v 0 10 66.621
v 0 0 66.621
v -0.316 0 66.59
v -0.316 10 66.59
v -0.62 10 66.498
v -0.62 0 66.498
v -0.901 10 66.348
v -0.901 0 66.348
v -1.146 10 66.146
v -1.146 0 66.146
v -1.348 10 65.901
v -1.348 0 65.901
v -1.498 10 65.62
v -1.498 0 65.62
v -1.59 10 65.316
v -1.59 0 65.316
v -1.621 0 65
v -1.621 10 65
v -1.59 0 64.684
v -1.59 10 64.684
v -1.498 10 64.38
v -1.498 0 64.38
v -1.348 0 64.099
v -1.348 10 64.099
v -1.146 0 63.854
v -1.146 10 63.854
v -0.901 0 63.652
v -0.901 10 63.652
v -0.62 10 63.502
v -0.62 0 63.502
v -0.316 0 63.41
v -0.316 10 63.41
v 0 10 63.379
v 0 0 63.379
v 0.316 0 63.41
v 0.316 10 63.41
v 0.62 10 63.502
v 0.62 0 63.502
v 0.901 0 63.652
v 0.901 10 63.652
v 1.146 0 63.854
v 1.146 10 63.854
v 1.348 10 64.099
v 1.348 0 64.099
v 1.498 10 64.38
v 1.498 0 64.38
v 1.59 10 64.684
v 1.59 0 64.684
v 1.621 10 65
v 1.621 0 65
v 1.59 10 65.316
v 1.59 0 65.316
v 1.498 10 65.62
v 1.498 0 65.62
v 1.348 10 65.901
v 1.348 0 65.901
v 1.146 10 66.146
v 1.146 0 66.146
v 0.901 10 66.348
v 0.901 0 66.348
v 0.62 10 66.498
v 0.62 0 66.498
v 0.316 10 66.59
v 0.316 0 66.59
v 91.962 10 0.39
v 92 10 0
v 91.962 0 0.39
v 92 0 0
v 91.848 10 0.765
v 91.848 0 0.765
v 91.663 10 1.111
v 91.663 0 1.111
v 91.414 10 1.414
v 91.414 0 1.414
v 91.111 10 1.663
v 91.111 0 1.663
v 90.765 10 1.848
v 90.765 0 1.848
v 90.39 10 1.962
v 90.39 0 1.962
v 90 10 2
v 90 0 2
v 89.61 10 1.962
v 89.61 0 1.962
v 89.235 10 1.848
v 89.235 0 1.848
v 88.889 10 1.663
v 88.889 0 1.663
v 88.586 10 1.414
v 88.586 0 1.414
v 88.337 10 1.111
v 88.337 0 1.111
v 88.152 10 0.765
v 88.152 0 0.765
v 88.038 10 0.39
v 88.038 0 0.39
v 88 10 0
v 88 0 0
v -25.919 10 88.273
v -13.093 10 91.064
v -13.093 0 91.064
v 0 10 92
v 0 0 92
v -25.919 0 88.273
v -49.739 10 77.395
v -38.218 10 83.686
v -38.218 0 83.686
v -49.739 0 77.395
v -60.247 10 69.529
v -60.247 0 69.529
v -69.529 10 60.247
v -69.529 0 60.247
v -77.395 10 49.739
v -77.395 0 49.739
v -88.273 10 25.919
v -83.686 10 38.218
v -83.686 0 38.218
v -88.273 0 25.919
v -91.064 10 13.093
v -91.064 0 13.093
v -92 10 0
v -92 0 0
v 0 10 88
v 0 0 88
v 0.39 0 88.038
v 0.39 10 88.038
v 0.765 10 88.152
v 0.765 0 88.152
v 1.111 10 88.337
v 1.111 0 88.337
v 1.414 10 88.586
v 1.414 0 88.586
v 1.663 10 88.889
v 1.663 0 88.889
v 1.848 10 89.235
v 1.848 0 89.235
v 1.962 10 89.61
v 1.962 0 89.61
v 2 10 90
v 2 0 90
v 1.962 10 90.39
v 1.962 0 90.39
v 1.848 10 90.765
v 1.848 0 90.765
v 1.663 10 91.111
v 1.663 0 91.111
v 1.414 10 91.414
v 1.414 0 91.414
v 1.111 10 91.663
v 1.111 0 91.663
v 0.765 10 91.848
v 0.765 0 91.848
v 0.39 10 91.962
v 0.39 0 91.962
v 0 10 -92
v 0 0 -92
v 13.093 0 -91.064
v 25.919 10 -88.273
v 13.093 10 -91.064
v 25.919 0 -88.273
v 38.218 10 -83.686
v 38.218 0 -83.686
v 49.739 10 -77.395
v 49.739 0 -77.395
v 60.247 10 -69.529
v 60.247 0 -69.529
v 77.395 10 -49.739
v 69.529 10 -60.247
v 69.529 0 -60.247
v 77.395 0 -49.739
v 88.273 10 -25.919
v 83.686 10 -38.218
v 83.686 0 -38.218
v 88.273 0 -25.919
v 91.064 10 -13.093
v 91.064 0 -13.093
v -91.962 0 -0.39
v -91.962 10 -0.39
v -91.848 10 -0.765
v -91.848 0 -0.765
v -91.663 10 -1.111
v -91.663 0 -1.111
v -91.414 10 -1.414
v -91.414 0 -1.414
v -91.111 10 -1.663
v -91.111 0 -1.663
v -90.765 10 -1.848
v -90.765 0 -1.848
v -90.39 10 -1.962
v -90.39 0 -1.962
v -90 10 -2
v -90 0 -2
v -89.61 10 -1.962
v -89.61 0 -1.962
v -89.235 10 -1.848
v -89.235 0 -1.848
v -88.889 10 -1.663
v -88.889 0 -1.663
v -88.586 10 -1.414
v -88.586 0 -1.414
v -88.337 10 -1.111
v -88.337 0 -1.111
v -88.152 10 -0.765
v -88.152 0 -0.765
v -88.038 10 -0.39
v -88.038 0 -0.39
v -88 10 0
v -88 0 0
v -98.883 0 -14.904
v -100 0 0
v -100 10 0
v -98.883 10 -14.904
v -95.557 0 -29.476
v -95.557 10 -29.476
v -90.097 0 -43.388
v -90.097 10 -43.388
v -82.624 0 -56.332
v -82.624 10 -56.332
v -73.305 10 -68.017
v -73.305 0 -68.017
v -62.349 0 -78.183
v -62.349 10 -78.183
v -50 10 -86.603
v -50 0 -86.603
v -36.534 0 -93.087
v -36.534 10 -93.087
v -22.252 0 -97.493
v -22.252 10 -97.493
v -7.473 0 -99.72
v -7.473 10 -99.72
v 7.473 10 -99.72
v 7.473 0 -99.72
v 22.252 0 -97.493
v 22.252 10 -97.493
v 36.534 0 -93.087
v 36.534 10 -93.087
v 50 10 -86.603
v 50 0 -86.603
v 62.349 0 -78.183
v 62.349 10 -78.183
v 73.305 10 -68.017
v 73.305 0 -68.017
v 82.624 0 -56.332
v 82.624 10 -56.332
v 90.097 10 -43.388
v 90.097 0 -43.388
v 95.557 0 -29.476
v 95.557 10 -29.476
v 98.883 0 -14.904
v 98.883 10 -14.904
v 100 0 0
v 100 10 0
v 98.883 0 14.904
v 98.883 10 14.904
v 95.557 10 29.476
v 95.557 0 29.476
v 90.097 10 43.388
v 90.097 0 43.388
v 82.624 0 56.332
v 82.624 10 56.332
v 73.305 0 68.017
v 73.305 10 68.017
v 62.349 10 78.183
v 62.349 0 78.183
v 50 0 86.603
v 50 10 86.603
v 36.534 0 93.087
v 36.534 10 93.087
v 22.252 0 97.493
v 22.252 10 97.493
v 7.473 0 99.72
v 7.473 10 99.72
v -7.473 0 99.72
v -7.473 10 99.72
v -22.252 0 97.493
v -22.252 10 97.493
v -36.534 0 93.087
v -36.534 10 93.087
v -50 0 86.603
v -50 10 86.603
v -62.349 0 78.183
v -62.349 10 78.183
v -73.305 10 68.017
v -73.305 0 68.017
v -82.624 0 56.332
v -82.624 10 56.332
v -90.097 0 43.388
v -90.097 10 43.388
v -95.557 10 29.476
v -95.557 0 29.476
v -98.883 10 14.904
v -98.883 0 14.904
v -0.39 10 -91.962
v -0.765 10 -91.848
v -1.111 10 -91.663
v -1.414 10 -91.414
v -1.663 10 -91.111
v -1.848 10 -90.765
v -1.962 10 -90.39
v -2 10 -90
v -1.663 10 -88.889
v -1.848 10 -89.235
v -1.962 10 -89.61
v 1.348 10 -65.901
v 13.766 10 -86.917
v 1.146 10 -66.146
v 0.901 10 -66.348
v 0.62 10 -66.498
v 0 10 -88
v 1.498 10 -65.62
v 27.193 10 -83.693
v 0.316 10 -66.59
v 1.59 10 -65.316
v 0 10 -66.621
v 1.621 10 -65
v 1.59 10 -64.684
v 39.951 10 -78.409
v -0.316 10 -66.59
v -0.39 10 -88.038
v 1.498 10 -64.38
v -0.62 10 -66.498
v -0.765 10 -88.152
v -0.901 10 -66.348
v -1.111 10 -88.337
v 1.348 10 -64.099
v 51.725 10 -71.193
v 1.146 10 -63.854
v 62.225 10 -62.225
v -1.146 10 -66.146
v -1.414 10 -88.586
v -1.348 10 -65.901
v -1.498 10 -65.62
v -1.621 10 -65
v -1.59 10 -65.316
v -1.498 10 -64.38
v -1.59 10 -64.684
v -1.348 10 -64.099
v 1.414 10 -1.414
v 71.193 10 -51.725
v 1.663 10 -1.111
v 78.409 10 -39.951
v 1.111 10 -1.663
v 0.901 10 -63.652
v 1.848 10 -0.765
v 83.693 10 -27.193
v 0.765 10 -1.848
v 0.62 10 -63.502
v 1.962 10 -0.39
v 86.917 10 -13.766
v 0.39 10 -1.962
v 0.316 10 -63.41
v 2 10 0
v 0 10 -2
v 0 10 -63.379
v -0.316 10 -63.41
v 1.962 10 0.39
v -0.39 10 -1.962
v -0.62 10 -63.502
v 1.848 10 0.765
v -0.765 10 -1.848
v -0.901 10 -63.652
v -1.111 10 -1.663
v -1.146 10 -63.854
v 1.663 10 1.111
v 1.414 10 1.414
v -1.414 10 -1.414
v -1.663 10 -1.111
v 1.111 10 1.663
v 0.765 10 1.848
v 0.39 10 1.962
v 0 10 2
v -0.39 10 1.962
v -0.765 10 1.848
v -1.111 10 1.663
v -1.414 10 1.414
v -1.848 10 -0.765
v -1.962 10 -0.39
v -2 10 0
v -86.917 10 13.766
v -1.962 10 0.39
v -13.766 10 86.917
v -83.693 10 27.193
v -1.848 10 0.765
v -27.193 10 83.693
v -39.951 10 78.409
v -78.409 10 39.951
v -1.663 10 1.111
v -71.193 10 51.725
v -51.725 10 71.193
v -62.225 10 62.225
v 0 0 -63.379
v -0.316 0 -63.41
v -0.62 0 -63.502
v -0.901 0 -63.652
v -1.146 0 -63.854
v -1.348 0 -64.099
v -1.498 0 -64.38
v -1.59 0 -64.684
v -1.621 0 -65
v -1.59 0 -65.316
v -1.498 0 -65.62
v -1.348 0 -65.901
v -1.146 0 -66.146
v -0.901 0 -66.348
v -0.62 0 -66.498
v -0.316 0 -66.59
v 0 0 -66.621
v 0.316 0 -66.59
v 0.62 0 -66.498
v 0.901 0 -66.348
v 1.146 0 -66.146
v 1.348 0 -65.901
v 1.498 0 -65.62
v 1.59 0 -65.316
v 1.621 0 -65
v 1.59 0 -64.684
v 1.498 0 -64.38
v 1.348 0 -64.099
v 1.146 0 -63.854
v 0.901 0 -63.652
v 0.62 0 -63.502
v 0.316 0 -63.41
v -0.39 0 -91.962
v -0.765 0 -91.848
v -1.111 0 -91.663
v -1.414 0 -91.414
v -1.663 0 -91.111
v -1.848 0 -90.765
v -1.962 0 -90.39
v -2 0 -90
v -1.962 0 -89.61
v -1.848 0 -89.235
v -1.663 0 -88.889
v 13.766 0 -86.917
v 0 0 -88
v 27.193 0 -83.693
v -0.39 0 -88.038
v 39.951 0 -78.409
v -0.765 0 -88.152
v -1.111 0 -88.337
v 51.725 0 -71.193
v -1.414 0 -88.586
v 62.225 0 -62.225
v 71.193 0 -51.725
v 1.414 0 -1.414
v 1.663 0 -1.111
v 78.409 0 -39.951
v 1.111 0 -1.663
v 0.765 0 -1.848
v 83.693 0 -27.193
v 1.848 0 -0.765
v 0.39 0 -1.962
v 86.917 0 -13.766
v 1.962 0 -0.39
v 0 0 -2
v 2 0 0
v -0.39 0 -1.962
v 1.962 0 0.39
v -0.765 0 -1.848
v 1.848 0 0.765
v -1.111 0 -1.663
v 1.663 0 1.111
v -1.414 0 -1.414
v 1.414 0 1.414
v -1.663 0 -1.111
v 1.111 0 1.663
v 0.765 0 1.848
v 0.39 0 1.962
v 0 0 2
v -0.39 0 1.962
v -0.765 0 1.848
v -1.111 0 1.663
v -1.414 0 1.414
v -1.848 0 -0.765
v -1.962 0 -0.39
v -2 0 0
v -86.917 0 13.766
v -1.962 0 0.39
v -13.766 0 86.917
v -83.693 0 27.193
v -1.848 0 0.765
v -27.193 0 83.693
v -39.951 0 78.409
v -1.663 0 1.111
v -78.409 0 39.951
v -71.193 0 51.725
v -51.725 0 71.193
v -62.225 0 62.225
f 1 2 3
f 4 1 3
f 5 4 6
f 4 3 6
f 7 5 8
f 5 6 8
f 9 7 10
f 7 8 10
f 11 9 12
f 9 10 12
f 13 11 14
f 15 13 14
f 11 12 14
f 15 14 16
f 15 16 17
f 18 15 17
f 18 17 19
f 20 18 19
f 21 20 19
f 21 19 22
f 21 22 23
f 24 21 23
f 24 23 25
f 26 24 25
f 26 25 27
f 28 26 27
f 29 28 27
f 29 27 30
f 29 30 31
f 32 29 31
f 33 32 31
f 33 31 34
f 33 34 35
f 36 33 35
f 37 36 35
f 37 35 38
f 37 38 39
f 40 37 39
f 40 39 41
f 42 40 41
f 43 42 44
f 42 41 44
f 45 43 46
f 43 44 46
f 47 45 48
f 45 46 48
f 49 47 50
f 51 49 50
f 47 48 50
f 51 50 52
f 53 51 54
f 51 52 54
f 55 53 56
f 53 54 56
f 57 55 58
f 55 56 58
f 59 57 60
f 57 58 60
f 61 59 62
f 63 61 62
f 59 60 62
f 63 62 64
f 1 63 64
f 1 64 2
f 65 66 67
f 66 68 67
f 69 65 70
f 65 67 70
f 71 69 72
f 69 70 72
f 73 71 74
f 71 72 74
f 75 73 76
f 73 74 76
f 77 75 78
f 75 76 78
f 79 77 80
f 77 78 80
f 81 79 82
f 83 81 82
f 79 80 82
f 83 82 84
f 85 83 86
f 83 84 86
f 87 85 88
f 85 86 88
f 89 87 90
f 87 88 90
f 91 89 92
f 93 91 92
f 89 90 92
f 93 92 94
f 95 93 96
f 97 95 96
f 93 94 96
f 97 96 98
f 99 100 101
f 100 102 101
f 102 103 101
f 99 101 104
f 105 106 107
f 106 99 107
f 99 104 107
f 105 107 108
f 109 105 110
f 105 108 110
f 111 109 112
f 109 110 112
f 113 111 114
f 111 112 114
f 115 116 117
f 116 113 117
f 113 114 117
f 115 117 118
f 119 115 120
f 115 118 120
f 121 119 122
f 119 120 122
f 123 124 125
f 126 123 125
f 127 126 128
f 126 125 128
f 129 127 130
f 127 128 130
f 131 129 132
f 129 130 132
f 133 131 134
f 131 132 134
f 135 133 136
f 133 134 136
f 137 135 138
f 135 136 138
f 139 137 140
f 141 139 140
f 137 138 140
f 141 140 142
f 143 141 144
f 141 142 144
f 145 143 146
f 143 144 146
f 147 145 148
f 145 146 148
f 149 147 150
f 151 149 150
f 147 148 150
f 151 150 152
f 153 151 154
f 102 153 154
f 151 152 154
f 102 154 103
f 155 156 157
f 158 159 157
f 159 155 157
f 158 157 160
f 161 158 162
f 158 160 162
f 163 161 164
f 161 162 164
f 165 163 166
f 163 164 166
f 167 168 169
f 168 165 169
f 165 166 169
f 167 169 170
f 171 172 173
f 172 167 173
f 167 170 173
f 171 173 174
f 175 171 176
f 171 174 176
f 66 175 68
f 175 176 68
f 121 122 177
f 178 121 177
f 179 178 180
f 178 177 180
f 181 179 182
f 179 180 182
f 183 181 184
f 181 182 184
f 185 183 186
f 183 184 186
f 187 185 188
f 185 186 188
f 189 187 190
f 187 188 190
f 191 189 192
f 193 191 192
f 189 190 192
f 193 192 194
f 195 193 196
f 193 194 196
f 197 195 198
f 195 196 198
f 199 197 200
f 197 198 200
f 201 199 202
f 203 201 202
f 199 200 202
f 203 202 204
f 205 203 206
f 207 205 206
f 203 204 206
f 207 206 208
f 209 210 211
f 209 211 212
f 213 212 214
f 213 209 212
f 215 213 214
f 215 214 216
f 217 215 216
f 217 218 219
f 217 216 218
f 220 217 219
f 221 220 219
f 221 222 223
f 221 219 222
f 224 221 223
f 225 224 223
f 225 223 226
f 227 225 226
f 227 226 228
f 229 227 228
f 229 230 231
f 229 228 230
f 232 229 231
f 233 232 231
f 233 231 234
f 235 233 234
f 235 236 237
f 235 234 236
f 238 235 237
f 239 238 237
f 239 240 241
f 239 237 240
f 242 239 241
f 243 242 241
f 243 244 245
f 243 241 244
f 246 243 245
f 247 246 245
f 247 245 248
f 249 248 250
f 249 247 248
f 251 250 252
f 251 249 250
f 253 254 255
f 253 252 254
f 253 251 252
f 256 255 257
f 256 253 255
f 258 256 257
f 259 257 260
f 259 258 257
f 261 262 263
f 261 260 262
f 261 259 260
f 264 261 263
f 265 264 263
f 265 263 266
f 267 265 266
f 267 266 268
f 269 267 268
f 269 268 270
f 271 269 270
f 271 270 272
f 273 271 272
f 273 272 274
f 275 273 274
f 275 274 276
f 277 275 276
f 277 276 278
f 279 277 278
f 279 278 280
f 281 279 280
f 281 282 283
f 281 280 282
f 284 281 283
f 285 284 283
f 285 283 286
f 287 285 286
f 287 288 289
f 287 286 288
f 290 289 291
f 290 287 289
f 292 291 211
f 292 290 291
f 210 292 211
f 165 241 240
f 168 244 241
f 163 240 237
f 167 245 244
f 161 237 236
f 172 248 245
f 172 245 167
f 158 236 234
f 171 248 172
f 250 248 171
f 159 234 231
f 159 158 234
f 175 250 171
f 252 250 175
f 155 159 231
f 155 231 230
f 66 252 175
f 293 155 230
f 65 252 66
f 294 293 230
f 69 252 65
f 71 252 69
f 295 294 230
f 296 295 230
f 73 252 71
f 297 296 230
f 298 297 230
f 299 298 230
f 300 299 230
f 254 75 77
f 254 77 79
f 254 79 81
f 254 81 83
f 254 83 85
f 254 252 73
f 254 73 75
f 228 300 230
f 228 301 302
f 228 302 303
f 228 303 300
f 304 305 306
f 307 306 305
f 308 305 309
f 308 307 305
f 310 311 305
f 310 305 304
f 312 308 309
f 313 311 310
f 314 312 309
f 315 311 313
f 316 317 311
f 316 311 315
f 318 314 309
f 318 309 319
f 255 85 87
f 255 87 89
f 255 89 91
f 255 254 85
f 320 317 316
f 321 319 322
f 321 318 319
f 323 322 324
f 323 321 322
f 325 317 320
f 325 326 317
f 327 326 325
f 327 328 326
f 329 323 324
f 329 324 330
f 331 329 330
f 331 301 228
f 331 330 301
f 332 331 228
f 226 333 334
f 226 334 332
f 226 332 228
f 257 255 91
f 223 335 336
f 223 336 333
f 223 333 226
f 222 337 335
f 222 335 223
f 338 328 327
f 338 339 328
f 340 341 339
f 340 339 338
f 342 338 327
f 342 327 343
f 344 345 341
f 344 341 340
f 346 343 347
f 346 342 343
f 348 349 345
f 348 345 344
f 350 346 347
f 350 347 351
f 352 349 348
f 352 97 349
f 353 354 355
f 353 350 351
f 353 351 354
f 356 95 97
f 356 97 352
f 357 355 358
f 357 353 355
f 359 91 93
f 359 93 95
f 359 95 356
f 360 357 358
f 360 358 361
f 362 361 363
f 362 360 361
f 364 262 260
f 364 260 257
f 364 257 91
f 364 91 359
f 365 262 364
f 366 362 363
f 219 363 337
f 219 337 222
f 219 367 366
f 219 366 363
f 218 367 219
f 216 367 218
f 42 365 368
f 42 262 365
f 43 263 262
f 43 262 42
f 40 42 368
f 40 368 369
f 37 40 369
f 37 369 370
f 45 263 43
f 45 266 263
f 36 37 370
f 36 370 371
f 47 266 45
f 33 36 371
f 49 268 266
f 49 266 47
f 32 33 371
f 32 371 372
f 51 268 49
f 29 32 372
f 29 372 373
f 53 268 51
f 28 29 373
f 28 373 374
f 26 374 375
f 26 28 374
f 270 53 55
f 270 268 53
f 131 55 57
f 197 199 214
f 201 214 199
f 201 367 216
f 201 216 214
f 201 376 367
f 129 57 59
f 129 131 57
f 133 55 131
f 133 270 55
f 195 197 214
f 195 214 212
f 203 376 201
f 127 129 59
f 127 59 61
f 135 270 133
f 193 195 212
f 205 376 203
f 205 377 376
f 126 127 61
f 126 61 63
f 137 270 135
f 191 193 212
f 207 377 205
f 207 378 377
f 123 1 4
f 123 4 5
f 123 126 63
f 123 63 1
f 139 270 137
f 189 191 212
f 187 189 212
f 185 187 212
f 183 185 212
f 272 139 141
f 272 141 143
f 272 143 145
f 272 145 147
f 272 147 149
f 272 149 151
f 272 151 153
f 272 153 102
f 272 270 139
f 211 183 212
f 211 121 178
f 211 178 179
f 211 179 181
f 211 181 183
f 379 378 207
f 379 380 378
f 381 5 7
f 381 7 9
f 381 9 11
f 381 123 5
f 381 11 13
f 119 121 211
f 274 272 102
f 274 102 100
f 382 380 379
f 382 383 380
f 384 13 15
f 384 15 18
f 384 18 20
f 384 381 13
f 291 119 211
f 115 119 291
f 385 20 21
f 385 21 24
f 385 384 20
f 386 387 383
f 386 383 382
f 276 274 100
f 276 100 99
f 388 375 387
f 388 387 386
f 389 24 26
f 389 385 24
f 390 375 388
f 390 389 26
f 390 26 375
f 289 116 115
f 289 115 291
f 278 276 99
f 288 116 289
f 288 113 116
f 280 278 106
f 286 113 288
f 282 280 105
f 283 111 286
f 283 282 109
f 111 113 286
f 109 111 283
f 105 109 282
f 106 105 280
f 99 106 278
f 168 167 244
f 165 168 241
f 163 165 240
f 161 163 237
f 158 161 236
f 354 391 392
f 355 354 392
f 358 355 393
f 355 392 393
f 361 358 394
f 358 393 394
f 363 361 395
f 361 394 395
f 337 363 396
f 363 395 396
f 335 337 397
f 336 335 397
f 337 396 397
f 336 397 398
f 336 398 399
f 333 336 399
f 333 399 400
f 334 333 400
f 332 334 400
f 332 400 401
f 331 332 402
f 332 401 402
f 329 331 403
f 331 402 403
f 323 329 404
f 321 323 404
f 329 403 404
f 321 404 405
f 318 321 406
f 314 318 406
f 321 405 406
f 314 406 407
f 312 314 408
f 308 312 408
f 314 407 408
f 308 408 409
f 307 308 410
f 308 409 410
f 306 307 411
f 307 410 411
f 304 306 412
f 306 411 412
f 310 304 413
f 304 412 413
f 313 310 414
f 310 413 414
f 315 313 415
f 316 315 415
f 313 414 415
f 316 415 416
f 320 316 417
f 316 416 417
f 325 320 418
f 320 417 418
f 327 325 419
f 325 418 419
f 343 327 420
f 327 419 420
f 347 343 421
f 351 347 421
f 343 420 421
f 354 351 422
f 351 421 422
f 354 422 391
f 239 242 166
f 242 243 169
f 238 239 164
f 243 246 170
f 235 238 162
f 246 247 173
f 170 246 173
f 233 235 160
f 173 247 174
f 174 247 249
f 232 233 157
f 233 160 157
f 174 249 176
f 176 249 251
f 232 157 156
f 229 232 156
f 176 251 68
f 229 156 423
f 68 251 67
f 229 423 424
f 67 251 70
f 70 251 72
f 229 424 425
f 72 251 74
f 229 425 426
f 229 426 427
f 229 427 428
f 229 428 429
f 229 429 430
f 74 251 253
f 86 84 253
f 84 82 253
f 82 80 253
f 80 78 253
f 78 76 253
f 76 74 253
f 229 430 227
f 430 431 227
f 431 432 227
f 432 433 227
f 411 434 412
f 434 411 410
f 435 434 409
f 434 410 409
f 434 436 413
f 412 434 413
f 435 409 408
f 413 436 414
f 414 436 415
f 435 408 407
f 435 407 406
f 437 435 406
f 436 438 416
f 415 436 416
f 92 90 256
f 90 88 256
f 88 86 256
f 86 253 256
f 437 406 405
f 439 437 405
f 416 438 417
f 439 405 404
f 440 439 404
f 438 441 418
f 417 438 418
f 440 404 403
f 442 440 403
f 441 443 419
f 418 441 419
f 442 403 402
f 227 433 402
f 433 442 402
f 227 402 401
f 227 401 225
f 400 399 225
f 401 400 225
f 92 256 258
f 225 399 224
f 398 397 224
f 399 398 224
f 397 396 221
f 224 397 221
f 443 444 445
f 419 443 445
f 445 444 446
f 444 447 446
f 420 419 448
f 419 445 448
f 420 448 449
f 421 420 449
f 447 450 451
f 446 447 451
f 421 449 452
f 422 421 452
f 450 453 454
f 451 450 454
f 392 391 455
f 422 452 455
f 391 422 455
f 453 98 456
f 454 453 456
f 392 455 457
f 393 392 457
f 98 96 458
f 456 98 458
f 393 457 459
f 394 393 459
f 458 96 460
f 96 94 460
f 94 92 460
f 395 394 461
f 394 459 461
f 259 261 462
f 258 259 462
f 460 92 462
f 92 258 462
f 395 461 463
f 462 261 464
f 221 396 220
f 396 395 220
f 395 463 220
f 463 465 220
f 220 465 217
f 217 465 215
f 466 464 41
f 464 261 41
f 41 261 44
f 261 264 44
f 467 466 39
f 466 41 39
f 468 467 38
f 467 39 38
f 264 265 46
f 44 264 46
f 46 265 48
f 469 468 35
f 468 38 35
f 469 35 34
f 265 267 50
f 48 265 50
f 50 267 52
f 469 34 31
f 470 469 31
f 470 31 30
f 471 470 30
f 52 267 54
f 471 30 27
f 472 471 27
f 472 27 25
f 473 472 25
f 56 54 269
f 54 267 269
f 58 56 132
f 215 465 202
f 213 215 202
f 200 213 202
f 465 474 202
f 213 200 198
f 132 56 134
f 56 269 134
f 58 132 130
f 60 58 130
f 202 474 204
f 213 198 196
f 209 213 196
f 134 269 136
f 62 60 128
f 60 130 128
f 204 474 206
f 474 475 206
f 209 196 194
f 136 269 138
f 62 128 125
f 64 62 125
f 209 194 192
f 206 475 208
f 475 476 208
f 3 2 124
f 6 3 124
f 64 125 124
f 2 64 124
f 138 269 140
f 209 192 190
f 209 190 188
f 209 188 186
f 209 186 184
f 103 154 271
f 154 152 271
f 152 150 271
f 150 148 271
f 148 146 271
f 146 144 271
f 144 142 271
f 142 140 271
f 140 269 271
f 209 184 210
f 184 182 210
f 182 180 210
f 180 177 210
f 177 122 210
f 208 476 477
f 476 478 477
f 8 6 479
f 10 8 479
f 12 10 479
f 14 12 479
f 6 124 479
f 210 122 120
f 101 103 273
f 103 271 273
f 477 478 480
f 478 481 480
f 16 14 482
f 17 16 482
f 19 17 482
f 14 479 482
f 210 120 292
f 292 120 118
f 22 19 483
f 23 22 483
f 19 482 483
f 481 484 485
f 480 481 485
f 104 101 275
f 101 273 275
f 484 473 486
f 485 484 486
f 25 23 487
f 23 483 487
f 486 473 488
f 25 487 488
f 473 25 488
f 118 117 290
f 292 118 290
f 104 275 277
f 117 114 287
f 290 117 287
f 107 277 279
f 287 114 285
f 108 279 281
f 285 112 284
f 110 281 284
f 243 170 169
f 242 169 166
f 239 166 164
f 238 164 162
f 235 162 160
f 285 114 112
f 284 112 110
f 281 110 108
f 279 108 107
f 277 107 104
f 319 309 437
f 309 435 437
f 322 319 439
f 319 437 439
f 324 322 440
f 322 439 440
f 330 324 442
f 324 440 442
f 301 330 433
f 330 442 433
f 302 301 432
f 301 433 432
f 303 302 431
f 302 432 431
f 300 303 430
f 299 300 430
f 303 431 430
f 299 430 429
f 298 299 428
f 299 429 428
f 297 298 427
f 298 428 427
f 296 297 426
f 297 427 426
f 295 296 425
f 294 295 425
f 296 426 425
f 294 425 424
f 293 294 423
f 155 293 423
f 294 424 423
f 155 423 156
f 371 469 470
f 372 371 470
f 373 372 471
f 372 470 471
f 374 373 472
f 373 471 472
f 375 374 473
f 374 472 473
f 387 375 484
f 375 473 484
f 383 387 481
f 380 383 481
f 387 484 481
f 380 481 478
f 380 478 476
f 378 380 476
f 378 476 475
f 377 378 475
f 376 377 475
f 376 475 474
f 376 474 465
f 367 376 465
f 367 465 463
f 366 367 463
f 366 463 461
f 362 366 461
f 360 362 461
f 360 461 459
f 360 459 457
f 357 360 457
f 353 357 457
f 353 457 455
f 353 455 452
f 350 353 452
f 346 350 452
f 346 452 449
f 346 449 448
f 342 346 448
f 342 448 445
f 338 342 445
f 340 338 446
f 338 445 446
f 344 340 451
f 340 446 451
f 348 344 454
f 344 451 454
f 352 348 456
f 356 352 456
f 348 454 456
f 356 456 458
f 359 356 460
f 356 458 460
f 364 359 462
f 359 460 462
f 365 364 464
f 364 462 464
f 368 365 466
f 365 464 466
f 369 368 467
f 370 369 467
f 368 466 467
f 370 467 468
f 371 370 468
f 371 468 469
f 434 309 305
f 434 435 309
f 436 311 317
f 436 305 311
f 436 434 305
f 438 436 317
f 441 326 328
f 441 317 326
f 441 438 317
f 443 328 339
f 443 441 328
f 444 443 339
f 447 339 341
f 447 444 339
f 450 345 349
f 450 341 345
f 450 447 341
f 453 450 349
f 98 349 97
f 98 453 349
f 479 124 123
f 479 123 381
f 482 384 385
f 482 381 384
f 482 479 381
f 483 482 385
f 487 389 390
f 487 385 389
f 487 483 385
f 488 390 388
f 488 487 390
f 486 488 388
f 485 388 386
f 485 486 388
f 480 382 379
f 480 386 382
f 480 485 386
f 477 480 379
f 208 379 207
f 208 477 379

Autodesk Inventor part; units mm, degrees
ref_plane "YZ Plane" through (0, 0, 0) normal (1, 0, 0) x (0, 1, 0)
ref_plane "XZ Plane" through (0, 0, 0) normal (0, 1, 0) x (-1, 0, 0)
ref_plane "XY Plane" through (0, 0, 0) normal (0, 0, 1) x (1, 0, 0)
sketch "Sketch1" plane through (0, 0, 0) normal (0, 1, 0) x (-1, 0, 0)
  circle A0 centre (0, 0) radius 100
  circle A1 centre (0, 0) radius 80
  circle A2 centre (0, 0) radius 90
  circle A3 centre (0, 0) radius 88
  circle A4 centre (0, 0) radius 92
  arc A5 (88, 0) -> (92, 0) centre (90, 0) ccw
  arc A6 (0, 92) -> (0, 88) centre (0, 90) ccw
  arc A7 (-88, 0) -> (-92, 0) centre (-90, 0) ccw
  arc A8 (0, -92) -> (0, -88) centre (0, -90) ccw
  dimension "d0" = 200
  dimension "d3" = 20
  dimension "d4" = 10
  dimension "d5" = 2
  dimension "d6" = 2
extrude "Extrusion1" add sketch "Sketch1" along normal blind 10 contours A0 | A1 | A6 A3 A7 A2 | A2 A7 A4 A6 | A5 A4 A8 A2 | A2 A8 A3 A5 | A3
sketch "Sketch2" plane through (0, 10, 0) normal (0, 1, 0) x (1, 0, 0)
  line L0 (0, 0) -> (0, -65)
  line L1 (0, -65) -> (0, 65)
  dimension "d7" = 65
  dimension "d8" = 130
hole "Hole1" at (0, 10, 65) at (0, 10, -65) direction (0, -1, 0) diameter 3.242 end through all thread size "M4x0.7" class "6H" standard "ISO Metric profile"
sketch "Sketch3" plane through (0, 10, 0) normal (0, 1, 0) x (1, 0, 0)
  point P0 (0, 0)
  point P1 (0, 0)
hole "Hole2" at (0, 10, 0) direction (0, -1, 0) diameter 4 end through all
properties part number "Aufhängung_Drehscheibe"
